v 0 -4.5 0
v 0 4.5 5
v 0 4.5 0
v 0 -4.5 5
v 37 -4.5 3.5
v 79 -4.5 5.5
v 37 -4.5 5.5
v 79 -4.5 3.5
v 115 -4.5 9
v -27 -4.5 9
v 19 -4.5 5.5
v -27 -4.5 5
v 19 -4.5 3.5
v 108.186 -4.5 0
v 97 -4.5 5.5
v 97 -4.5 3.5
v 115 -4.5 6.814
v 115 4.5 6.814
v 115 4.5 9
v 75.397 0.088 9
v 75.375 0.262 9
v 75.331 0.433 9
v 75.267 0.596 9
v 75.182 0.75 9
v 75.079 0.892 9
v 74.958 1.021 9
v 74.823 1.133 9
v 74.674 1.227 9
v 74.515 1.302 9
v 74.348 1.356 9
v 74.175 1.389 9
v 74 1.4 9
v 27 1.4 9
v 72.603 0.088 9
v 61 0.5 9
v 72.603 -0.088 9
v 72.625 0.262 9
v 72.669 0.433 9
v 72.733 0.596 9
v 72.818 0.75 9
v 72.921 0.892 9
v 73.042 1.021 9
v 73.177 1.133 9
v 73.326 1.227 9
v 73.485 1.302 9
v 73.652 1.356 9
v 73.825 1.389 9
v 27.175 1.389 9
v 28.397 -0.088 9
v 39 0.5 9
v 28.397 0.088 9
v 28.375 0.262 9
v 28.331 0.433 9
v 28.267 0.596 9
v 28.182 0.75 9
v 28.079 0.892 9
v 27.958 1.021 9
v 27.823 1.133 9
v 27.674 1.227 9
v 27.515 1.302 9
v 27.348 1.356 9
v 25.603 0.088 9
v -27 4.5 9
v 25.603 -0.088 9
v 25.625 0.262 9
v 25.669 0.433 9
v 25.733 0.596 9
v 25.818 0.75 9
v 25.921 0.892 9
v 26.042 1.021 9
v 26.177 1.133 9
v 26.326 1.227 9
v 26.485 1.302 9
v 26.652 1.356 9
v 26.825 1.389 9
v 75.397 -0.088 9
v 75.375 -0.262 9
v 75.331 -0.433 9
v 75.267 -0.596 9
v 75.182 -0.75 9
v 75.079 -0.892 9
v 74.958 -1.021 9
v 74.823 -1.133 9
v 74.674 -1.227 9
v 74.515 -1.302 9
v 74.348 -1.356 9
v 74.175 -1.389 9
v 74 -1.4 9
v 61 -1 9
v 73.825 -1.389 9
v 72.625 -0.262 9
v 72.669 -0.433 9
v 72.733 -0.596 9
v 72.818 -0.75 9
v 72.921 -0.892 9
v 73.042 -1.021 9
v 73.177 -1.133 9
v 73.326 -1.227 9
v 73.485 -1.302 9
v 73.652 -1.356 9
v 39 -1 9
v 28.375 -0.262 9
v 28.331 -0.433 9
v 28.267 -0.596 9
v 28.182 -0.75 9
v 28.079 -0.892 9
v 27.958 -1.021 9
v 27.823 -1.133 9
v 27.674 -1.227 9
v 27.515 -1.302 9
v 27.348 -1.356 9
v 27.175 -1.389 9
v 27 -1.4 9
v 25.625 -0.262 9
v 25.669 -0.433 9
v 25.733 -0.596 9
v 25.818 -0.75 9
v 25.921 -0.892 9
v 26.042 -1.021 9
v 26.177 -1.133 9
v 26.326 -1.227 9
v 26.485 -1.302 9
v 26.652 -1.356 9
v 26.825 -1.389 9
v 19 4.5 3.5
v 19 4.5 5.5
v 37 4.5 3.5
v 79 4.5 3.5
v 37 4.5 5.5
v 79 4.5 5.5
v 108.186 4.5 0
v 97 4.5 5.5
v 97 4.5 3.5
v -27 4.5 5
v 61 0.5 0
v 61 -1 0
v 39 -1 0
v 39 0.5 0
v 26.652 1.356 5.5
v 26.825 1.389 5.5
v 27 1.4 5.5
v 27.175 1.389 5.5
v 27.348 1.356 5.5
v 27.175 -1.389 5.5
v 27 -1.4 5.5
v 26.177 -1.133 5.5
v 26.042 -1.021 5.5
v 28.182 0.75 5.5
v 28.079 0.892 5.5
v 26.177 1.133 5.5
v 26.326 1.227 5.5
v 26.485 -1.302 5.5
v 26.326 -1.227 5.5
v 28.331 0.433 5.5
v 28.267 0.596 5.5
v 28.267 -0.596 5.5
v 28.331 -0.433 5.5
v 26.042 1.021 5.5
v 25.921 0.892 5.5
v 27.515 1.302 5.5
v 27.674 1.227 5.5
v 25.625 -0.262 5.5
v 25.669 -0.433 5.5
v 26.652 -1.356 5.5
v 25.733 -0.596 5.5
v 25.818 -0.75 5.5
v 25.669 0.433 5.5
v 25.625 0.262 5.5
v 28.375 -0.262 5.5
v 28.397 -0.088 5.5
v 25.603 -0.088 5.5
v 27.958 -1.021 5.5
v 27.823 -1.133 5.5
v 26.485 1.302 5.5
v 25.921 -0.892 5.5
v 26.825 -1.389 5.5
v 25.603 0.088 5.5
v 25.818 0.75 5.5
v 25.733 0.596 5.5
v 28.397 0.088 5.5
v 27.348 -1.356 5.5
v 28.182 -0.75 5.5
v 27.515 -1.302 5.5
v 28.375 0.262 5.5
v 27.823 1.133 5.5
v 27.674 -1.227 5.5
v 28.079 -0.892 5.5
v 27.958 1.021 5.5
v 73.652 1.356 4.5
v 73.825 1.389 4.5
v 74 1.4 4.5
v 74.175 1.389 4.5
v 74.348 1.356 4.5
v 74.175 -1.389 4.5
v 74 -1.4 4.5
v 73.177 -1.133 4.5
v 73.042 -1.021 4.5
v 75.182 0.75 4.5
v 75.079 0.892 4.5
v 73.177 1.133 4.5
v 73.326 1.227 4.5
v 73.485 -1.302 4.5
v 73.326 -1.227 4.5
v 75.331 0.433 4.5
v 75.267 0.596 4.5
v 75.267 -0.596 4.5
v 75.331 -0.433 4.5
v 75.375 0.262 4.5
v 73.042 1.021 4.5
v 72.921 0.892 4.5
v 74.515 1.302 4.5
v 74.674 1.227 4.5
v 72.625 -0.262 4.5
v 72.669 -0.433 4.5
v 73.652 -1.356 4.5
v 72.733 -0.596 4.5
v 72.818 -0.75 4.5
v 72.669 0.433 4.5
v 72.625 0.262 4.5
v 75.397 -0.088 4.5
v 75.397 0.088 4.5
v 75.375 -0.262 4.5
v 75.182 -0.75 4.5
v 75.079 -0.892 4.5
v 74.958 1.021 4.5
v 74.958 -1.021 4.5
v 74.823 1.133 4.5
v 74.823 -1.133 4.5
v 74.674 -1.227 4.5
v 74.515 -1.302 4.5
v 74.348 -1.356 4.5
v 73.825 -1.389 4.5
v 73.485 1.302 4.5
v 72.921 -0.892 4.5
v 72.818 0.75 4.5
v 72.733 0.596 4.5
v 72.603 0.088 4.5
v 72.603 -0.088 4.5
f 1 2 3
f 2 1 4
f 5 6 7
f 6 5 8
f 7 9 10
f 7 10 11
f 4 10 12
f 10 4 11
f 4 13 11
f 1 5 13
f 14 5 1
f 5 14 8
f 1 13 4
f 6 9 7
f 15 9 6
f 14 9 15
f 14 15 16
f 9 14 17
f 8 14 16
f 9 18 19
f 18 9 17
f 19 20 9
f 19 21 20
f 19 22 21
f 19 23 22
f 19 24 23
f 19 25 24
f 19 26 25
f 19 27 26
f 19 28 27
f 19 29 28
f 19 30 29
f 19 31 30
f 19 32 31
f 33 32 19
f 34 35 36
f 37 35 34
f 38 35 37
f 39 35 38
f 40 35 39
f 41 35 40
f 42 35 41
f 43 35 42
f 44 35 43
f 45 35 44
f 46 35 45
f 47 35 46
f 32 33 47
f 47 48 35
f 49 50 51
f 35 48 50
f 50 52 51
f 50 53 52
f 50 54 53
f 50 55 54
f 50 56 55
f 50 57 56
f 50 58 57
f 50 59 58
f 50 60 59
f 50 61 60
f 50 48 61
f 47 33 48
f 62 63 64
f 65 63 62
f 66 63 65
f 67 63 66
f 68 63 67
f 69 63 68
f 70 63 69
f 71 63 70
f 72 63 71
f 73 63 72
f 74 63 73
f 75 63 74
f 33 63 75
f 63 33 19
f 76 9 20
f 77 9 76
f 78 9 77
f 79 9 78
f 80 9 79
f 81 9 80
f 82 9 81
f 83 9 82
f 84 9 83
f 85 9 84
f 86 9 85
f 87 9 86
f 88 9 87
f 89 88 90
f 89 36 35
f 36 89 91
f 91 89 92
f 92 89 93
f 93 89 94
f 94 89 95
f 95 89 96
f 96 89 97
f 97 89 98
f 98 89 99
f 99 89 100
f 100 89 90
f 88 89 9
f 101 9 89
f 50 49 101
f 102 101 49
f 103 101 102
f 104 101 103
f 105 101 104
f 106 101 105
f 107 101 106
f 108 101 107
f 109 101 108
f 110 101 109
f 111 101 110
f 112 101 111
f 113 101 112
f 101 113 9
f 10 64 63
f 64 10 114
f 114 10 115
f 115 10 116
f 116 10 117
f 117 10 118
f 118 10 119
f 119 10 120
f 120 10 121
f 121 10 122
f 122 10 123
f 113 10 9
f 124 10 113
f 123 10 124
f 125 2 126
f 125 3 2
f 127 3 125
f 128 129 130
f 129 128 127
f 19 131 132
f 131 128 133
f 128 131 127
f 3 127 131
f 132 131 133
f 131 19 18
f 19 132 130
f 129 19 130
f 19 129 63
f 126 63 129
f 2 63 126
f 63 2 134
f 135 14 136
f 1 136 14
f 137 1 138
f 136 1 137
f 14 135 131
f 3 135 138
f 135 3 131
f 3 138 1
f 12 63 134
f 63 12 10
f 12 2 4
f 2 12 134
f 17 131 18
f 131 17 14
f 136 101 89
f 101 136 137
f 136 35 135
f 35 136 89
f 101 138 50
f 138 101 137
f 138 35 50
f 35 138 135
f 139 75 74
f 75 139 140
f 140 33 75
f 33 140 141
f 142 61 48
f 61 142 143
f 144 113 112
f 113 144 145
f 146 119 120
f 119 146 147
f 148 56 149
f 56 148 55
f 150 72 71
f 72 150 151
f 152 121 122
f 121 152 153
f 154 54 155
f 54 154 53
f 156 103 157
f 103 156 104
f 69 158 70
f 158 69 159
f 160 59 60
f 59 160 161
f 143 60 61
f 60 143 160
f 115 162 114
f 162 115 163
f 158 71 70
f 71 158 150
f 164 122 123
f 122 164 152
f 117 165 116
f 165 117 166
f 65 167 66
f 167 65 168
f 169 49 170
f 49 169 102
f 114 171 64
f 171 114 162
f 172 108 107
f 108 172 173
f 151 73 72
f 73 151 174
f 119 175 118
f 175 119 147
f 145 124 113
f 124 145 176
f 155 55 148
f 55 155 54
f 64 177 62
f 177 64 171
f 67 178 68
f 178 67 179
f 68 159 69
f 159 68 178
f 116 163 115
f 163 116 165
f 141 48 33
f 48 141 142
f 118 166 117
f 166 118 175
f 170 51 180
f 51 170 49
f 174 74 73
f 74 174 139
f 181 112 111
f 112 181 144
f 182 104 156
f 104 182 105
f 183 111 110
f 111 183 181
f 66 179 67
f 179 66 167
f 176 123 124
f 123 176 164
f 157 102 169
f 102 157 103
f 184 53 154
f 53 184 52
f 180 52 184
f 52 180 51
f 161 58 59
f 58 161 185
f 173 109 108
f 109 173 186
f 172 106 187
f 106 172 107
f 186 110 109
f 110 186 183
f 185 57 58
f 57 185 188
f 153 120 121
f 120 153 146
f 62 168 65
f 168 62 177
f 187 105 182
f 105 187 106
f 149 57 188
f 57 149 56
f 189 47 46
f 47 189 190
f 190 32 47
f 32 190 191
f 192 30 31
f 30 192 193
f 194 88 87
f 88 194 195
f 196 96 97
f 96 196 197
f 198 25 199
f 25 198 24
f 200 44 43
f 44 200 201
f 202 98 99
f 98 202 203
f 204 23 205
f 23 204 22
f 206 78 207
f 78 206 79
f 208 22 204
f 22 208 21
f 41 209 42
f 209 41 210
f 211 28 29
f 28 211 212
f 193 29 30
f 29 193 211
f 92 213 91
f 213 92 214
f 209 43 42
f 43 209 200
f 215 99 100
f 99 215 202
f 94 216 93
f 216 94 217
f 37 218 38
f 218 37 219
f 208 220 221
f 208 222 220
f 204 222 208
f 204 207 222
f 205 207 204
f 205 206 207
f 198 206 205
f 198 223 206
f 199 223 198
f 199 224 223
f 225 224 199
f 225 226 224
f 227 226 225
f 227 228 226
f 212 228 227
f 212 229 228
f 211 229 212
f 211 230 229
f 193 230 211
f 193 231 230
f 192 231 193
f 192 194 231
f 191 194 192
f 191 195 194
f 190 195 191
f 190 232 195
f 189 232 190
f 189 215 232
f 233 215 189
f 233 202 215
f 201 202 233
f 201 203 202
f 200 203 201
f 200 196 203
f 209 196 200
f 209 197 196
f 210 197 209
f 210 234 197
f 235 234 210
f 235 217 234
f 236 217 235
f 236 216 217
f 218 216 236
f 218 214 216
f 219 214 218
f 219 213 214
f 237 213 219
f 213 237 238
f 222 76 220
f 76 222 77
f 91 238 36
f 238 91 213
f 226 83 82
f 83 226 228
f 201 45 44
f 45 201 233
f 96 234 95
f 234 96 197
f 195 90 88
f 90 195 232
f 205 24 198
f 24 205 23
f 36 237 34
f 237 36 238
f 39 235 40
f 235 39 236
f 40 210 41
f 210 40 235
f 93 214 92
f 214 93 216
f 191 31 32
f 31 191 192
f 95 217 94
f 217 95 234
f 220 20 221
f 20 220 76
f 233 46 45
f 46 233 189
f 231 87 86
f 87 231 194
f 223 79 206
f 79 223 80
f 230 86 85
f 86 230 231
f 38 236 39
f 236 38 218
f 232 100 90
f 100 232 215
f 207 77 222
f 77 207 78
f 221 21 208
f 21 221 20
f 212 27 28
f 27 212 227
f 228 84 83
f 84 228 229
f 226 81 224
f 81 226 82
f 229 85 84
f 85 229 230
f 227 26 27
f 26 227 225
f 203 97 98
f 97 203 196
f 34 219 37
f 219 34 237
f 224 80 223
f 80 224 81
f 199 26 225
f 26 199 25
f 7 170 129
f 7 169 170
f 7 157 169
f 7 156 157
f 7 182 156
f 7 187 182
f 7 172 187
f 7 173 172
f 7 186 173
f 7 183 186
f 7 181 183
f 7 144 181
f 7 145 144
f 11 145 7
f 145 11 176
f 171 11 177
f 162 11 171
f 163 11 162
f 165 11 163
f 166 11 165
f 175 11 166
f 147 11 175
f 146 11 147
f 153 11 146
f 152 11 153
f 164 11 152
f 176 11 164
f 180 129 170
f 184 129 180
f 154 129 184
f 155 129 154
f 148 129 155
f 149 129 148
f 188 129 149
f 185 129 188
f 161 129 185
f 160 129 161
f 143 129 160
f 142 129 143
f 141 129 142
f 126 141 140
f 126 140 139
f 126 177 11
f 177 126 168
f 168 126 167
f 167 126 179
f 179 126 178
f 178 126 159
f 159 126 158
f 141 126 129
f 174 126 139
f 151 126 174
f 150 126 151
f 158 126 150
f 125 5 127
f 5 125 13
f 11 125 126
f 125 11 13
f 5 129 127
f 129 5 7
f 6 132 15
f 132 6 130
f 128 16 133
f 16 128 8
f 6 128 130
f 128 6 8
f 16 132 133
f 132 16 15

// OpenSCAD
$fn=50;

KEEL_W=9.0;
KEEL_H=9.0;
KEEL_L=115;


module cutout_group(y_position) {
    translate([0, y_position, 0]) {
        // front of keel slope
        translate([-5, -KEEL_L-1, -3])
        rotate([-45, 0, 0])
        //(x, z, y)
        cube([10, 11, 8]); 
        /*
        // rear of keel slope
        translate([-5, -1, -10])
        rotate([45, 0, 0])
        //(x, z, y)
        #cube([10, 11, 8]);  
        */
        //center cutout - vent
        translate([-1.0, -34.0, -5.0])
        rotate([90,0,0])
        //y, z, x
        cube([1.5, 10, 22]);

        // screw holes
        translate([0, -22, 0]) cylinder(h=5, d=2.8); 
        translate([0.0, -69, 0]) cylinder(h=5, d=2.8);   

        // thru slots for straps
        translate([-7.0, -32,-1]) cube([14, 18, 2]);       
        translate([-7.0, -92,-1]) cube([14, 18, 2]);
    }
}

// translate and rotate so model starts at 0, 0, 0
translate([0, 0, KEEL_H/2]) {
    rotate([180, 180, -90]) { // Flipping the entire object along the Y axis
        difference() {
            union() {           
                // keel
                rotate([90,0,0]){
                linear_extrude(KEEL_L) square([KEEL_W, KEEL_H], center=true); 
                translate([0, 2.5, -27]) // y,z,x
                linear_extrude(30) square([KEEL_W, 4], center=true); 
                }   
            }
            cutout_group(-5);
        }
    }
}

module cable_clamp(y_position) {
    translate([1.5, y_position, 4.5]) {
        rotate([90, 0, 0]) {
            union() {
                // Vertical arm of the C-clamp 2
                translate([2.0, 0, 0]) cube([2, 5, 8]);
                // Horizontal arm of the C-clamp
                rotate([90, 0, 0])
                translate([0, 0, -5]) cube([2, 8, 2]);
                // Vertical arm of the C-clamp 1
                translate([-7, 0, 0]) cube([2, 5, 8]);
                // Horizontal arm of the C-clamp
                rotate([90, 0, 0])
                translate([-5.0, 0,-5]) cube([2, 8, 2]);
                // clamp bed
                rotate([90, 0, 0])
                translate([-7.0, 0,-0]) cube([11, 8, 2]);
            }
        }
    }
}
